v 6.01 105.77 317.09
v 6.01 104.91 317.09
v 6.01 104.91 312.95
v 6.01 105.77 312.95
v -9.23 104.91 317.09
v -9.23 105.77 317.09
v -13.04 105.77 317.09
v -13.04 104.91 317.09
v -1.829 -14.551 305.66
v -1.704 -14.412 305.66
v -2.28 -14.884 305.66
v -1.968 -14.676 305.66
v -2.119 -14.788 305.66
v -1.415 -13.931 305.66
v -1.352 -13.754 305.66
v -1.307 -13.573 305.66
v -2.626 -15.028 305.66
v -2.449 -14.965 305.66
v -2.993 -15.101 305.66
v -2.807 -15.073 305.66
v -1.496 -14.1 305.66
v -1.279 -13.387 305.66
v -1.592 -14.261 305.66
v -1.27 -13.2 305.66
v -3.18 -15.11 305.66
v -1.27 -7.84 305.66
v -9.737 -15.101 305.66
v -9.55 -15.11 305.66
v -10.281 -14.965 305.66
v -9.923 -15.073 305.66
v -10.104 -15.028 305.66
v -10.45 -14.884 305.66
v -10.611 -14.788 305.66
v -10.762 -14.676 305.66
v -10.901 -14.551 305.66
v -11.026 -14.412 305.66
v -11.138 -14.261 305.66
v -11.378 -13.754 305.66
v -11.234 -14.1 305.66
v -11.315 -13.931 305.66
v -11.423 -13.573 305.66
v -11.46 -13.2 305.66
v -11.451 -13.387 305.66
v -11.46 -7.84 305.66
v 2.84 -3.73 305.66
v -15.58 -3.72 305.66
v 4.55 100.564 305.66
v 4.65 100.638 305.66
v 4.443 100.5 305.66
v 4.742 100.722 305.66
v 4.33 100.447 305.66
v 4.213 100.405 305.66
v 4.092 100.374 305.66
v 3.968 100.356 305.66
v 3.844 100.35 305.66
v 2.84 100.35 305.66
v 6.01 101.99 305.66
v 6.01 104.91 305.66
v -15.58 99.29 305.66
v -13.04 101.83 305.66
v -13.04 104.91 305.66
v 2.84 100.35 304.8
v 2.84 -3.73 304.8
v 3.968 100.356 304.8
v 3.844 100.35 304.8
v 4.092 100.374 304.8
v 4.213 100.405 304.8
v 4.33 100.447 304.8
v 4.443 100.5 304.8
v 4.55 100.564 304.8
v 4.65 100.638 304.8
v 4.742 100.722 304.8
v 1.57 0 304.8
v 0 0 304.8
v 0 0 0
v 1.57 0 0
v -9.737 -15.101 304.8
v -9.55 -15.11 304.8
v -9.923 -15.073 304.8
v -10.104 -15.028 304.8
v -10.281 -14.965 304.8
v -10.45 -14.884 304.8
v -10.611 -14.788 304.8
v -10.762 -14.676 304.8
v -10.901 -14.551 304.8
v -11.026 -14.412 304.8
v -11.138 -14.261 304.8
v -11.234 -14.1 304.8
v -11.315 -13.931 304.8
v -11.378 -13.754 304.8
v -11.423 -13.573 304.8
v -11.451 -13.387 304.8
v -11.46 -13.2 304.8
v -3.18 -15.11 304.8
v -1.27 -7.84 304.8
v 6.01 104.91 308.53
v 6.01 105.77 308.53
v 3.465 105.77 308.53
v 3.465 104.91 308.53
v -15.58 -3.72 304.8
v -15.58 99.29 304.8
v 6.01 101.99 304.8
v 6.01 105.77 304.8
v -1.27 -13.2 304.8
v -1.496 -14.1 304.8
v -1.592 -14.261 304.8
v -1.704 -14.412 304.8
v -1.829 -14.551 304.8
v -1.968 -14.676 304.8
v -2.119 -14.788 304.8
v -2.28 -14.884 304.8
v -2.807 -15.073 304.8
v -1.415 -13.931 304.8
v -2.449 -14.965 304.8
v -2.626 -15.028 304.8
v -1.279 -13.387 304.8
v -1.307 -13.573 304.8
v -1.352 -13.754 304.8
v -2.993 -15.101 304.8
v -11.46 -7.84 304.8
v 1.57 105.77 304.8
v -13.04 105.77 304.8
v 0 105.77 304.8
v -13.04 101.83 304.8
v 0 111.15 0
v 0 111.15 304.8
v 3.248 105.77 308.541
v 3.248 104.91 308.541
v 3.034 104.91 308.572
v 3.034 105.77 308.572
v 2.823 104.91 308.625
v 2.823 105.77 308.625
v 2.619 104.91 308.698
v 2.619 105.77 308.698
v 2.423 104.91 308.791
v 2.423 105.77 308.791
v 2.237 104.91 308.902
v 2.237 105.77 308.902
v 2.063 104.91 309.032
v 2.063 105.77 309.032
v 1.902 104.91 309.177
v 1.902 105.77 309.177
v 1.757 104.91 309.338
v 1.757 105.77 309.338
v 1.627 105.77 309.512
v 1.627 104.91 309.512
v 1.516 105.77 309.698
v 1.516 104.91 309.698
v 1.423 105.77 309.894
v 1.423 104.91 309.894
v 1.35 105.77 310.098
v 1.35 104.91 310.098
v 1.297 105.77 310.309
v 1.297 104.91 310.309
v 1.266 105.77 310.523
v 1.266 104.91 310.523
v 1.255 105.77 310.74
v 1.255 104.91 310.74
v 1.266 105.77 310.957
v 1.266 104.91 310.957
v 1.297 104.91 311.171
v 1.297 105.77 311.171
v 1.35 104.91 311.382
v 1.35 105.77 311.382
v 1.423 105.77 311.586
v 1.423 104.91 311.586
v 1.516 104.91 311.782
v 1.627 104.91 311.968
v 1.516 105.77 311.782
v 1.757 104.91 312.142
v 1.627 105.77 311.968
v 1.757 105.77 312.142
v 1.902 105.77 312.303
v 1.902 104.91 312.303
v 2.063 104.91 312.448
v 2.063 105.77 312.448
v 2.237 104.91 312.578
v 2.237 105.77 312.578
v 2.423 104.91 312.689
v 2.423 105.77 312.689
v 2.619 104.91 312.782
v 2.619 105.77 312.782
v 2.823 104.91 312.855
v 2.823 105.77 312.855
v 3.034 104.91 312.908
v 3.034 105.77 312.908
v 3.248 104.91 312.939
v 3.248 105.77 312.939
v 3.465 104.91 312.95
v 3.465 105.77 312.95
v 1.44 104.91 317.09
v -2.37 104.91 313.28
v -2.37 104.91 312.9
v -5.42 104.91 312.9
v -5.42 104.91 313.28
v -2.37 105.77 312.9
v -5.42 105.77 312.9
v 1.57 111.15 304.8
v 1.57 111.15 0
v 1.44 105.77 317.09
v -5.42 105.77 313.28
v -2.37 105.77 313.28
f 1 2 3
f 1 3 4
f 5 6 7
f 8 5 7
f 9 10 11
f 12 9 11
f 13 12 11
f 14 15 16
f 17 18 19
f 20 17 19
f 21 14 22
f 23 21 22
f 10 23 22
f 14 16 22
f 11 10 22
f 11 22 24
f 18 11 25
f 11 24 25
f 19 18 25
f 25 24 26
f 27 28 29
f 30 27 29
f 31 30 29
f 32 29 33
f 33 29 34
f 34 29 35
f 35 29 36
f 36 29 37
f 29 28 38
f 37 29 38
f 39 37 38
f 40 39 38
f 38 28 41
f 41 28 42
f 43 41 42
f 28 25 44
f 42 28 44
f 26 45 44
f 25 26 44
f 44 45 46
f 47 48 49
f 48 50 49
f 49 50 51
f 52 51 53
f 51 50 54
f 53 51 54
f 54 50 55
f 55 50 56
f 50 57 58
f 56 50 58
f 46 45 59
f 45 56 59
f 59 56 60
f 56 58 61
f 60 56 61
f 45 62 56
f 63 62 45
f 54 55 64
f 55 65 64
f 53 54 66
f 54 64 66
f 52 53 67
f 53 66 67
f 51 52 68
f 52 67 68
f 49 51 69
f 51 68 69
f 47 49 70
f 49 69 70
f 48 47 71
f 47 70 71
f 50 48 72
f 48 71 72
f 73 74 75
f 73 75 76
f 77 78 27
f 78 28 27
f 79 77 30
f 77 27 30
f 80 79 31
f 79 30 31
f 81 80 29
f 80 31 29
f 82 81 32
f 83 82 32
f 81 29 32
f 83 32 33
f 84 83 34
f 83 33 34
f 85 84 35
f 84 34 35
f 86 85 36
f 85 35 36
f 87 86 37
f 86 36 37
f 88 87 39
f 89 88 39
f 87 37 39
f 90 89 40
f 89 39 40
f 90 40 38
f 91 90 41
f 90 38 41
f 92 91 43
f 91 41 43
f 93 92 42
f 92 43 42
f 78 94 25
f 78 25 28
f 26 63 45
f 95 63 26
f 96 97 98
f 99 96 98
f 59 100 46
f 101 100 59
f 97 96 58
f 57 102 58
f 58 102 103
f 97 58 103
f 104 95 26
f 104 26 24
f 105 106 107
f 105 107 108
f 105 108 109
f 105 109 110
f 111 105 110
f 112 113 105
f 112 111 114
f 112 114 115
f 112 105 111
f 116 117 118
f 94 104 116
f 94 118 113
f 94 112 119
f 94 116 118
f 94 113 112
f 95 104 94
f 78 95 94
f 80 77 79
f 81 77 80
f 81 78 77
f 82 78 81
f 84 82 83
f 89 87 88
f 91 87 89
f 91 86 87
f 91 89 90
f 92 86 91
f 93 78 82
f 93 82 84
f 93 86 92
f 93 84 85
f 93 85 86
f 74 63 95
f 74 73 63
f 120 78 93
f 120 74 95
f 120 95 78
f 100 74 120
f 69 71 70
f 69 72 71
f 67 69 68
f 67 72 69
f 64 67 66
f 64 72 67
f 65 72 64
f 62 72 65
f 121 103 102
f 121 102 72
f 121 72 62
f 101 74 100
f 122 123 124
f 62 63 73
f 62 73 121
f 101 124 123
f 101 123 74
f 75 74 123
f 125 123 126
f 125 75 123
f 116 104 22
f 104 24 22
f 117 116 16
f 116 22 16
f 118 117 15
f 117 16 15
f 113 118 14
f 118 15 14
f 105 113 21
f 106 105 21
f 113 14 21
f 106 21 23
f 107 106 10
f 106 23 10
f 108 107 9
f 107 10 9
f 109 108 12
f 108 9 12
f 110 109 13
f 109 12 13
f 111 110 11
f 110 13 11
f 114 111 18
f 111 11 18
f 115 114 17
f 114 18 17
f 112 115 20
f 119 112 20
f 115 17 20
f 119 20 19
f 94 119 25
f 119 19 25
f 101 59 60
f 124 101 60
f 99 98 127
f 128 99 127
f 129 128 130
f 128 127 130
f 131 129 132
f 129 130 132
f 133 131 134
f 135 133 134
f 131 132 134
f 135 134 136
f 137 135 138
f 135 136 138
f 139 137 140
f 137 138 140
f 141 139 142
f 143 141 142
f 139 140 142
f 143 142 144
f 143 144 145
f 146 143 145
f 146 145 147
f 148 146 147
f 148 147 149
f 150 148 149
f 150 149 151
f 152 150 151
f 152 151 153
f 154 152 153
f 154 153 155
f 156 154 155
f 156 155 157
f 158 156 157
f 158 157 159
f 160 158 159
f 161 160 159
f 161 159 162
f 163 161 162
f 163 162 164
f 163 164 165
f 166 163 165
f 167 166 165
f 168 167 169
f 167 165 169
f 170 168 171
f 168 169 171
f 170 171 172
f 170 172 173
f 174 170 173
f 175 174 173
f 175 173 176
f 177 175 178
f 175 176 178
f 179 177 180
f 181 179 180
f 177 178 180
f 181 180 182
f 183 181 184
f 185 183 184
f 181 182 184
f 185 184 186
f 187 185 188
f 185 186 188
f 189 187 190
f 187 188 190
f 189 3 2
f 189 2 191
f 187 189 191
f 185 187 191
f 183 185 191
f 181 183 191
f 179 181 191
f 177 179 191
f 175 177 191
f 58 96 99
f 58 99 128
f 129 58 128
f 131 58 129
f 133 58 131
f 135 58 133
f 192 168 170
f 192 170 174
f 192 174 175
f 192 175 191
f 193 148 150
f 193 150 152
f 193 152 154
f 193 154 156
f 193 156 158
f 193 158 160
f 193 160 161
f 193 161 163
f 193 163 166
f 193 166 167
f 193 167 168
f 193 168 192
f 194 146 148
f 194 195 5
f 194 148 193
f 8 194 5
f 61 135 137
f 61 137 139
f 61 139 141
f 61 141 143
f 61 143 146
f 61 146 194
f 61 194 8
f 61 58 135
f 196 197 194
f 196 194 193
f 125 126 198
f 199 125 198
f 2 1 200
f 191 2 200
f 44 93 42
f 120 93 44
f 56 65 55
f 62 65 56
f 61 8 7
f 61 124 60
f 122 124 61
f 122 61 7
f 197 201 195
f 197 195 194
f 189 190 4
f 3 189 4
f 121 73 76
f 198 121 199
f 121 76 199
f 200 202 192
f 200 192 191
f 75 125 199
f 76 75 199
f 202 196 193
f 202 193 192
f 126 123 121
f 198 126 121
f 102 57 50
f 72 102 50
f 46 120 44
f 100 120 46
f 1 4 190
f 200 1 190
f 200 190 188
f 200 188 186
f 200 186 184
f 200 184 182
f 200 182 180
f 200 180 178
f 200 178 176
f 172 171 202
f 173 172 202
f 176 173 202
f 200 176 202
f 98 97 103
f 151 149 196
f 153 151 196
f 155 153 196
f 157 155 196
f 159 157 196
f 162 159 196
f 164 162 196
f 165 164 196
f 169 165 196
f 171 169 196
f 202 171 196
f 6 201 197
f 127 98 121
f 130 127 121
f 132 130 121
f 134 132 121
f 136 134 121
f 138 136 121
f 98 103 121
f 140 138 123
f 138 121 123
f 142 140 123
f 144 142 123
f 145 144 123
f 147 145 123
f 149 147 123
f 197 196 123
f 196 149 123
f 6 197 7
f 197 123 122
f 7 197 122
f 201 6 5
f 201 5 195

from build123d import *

# Parameters (mm, degrees)
SKETCH1_W           = 1.57
SKETCH1_H           = 111.15
PCB_DEPTH           = 304.8
BOSS_EXTRUDE2_DEPTH = 0.86
CUT_EXTRUDE1_REACH  = 327.615
CUT_EXTRUDE2_REACH  = 327.615
FILLET2_R           = 1.27
FILLET1_R           = 1.91
SKETCH8_W           = 19.05
SKETCH8_H           = 0.86
BOSS_EXTRUDE4_DEPTH = 12.29
CUT_EXTRUDE3_REACH  = 341.707


with BuildPart() as part:
    # Sketch1 → pcb (new body)
    with BuildSketch(Plane.XY):
        with Locations((0.785, 55.575)):
            Rectangle(SKETCH1_W, SKETCH1_H)
    extrude(amount=PCB_DEPTH)

    # mounting-slot → Boss-Extrude2 (add)
    with BuildSketch(Plane.XY.offset(304.8)):
        Polygon((-15.58, 104.91), (2.84, 104.91), (6.01, 104.91), (6.01, 100.35), (2.84, 100.35), (2.84, -3.73), (-1.27, -7.84), (-1.27, -15.11), (-11.46, -15.11), (-11.46, -7.84), (-15.58, -3.72), align=None)
    extrude(amount=BOSS_EXTRUDE2_DEPTH)

    # Sketch5 → Cut-Extrude1 (cut, up to next)
    with BuildSketch(Plane.XY.offset(305.66), mode=Mode.PRIVATE) as cut_extrude1_sk1:
        Polygon((-15.58, 99.29), (-13.04, 101.83), (-13.04, 104.91), (-15.58, 104.91), align=None)
    cut_extrude1_tool1 = extrude(cut_extrude1_sk1.sketch, amount=-CUT_EXTRUDE1_REACH, mode=Mode.PRIVATE) & part.part
    add(cut_extrude1_tool1.solids().sort_by_distance((-14.433594, 102.673203, 305.66))[0], mode=Mode.SUBTRACT)

    # Sketch7 → Cut-Extrude2 (cut, up to next)
    with BuildSketch(Plane.XY.offset(305.66), mode=Mode.PRIVATE) as cut_extrude2_sk1:
        Polygon((6.01, 101.99), (4.37, 100.35), (6.01, 100.35), align=None)
    cut_extrude2_tool1 = extrude(cut_extrude2_sk1.sketch, amount=-CUT_EXTRUDE2_REACH, mode=Mode.PRIVATE) & part.part
    add(cut_extrude2_tool1.solids().sort_by_distance((5.463333, 100.896667, 305.66))[0], mode=Mode.SUBTRACT)

    # Fillet2
    fillet2_edges = [part.edges().sort_by_distance(p)[0] for p in [
        (4.37, 100.35, 305.23),
    ]]
    fillet(fillet2_edges, radius=FILLET2_R)

    # Fillet1
    fillet1_edges = [part.edges().sort_by_distance(p)[0] for p in [
        (-11.46, -15.11, 305.23),
        (-1.27, -15.11, 305.23),
    ]]
    fillet(fillet1_edges, radius=FILLET1_R)

    # Sketch8 → Boss-Extrude4 (add)
    with BuildSketch(Plane(origin=(0, 0, 304.8), x_dir=(-1, 0, 0), z_dir=(0, 0, -1))):
        with Locations((3.515, 105.34)):
            Rectangle(SKETCH8_W, SKETCH8_H)
    extrude(amount=-BOSS_EXTRUDE4_DEPTH)

    # Sketch9 → Cut-Extrude3 (cut, up to next)
    with BuildSketch(Plane(origin=(0, 105.77, 0), x_dir=(1, 0, 0), z_dir=(0, 1, 0)), mode=Mode.PRIVATE) as cut_extrude3_sk1:
        Polygon((-9.23, -317.09), (-5.42, -313.28), (-5.42, -312.9), (-2.37, -312.9), (-2.37, -313.28), (1.44, -317.09), align=None)
    cut_extrude3_tool1 = extrude(cut_extrude3_sk1.sketch, amount=-CUT_EXTRUDE3_REACH, mode=Mode.PRIVATE) & part.part
    # Sketch9 → Cut-Extrude3 (cut, up to next)
    with BuildSketch(Plane(origin=(0, 105.77, 0), x_dir=(1, 0, 0), z_dir=(0, 1, 0)), mode=Mode.PRIVATE) as cut_extrude3_sk2:
        with BuildLine():
            Line((6.01, -308.53), (3.465, -308.53))
            ThreePointArc((3.465, -308.53), (1.255, -310.74), (3.465, -312.95))
            Line((3.465, -312.95), (6.01, -312.95))
            Line((6.01, -312.95), (6.01, -308.53))
        make_face()
    cut_extrude3_tool2 = extrude(cut_extrude3_sk2.sketch, amount=-CUT_EXTRUDE3_REACH, mode=Mode.PRIVATE) & part.part
    add(cut_extrude3_tool1.solids().sort_by_distance((-3.895, 105.77, 315.433744))[0], mode=Mode.SUBTRACT)
    add(cut_extrude3_tool2.solids().sort_by_distance((3.841216, 105.77, 310.74))[0], mode=Mode.SUBTRACT)


solid = part.part
